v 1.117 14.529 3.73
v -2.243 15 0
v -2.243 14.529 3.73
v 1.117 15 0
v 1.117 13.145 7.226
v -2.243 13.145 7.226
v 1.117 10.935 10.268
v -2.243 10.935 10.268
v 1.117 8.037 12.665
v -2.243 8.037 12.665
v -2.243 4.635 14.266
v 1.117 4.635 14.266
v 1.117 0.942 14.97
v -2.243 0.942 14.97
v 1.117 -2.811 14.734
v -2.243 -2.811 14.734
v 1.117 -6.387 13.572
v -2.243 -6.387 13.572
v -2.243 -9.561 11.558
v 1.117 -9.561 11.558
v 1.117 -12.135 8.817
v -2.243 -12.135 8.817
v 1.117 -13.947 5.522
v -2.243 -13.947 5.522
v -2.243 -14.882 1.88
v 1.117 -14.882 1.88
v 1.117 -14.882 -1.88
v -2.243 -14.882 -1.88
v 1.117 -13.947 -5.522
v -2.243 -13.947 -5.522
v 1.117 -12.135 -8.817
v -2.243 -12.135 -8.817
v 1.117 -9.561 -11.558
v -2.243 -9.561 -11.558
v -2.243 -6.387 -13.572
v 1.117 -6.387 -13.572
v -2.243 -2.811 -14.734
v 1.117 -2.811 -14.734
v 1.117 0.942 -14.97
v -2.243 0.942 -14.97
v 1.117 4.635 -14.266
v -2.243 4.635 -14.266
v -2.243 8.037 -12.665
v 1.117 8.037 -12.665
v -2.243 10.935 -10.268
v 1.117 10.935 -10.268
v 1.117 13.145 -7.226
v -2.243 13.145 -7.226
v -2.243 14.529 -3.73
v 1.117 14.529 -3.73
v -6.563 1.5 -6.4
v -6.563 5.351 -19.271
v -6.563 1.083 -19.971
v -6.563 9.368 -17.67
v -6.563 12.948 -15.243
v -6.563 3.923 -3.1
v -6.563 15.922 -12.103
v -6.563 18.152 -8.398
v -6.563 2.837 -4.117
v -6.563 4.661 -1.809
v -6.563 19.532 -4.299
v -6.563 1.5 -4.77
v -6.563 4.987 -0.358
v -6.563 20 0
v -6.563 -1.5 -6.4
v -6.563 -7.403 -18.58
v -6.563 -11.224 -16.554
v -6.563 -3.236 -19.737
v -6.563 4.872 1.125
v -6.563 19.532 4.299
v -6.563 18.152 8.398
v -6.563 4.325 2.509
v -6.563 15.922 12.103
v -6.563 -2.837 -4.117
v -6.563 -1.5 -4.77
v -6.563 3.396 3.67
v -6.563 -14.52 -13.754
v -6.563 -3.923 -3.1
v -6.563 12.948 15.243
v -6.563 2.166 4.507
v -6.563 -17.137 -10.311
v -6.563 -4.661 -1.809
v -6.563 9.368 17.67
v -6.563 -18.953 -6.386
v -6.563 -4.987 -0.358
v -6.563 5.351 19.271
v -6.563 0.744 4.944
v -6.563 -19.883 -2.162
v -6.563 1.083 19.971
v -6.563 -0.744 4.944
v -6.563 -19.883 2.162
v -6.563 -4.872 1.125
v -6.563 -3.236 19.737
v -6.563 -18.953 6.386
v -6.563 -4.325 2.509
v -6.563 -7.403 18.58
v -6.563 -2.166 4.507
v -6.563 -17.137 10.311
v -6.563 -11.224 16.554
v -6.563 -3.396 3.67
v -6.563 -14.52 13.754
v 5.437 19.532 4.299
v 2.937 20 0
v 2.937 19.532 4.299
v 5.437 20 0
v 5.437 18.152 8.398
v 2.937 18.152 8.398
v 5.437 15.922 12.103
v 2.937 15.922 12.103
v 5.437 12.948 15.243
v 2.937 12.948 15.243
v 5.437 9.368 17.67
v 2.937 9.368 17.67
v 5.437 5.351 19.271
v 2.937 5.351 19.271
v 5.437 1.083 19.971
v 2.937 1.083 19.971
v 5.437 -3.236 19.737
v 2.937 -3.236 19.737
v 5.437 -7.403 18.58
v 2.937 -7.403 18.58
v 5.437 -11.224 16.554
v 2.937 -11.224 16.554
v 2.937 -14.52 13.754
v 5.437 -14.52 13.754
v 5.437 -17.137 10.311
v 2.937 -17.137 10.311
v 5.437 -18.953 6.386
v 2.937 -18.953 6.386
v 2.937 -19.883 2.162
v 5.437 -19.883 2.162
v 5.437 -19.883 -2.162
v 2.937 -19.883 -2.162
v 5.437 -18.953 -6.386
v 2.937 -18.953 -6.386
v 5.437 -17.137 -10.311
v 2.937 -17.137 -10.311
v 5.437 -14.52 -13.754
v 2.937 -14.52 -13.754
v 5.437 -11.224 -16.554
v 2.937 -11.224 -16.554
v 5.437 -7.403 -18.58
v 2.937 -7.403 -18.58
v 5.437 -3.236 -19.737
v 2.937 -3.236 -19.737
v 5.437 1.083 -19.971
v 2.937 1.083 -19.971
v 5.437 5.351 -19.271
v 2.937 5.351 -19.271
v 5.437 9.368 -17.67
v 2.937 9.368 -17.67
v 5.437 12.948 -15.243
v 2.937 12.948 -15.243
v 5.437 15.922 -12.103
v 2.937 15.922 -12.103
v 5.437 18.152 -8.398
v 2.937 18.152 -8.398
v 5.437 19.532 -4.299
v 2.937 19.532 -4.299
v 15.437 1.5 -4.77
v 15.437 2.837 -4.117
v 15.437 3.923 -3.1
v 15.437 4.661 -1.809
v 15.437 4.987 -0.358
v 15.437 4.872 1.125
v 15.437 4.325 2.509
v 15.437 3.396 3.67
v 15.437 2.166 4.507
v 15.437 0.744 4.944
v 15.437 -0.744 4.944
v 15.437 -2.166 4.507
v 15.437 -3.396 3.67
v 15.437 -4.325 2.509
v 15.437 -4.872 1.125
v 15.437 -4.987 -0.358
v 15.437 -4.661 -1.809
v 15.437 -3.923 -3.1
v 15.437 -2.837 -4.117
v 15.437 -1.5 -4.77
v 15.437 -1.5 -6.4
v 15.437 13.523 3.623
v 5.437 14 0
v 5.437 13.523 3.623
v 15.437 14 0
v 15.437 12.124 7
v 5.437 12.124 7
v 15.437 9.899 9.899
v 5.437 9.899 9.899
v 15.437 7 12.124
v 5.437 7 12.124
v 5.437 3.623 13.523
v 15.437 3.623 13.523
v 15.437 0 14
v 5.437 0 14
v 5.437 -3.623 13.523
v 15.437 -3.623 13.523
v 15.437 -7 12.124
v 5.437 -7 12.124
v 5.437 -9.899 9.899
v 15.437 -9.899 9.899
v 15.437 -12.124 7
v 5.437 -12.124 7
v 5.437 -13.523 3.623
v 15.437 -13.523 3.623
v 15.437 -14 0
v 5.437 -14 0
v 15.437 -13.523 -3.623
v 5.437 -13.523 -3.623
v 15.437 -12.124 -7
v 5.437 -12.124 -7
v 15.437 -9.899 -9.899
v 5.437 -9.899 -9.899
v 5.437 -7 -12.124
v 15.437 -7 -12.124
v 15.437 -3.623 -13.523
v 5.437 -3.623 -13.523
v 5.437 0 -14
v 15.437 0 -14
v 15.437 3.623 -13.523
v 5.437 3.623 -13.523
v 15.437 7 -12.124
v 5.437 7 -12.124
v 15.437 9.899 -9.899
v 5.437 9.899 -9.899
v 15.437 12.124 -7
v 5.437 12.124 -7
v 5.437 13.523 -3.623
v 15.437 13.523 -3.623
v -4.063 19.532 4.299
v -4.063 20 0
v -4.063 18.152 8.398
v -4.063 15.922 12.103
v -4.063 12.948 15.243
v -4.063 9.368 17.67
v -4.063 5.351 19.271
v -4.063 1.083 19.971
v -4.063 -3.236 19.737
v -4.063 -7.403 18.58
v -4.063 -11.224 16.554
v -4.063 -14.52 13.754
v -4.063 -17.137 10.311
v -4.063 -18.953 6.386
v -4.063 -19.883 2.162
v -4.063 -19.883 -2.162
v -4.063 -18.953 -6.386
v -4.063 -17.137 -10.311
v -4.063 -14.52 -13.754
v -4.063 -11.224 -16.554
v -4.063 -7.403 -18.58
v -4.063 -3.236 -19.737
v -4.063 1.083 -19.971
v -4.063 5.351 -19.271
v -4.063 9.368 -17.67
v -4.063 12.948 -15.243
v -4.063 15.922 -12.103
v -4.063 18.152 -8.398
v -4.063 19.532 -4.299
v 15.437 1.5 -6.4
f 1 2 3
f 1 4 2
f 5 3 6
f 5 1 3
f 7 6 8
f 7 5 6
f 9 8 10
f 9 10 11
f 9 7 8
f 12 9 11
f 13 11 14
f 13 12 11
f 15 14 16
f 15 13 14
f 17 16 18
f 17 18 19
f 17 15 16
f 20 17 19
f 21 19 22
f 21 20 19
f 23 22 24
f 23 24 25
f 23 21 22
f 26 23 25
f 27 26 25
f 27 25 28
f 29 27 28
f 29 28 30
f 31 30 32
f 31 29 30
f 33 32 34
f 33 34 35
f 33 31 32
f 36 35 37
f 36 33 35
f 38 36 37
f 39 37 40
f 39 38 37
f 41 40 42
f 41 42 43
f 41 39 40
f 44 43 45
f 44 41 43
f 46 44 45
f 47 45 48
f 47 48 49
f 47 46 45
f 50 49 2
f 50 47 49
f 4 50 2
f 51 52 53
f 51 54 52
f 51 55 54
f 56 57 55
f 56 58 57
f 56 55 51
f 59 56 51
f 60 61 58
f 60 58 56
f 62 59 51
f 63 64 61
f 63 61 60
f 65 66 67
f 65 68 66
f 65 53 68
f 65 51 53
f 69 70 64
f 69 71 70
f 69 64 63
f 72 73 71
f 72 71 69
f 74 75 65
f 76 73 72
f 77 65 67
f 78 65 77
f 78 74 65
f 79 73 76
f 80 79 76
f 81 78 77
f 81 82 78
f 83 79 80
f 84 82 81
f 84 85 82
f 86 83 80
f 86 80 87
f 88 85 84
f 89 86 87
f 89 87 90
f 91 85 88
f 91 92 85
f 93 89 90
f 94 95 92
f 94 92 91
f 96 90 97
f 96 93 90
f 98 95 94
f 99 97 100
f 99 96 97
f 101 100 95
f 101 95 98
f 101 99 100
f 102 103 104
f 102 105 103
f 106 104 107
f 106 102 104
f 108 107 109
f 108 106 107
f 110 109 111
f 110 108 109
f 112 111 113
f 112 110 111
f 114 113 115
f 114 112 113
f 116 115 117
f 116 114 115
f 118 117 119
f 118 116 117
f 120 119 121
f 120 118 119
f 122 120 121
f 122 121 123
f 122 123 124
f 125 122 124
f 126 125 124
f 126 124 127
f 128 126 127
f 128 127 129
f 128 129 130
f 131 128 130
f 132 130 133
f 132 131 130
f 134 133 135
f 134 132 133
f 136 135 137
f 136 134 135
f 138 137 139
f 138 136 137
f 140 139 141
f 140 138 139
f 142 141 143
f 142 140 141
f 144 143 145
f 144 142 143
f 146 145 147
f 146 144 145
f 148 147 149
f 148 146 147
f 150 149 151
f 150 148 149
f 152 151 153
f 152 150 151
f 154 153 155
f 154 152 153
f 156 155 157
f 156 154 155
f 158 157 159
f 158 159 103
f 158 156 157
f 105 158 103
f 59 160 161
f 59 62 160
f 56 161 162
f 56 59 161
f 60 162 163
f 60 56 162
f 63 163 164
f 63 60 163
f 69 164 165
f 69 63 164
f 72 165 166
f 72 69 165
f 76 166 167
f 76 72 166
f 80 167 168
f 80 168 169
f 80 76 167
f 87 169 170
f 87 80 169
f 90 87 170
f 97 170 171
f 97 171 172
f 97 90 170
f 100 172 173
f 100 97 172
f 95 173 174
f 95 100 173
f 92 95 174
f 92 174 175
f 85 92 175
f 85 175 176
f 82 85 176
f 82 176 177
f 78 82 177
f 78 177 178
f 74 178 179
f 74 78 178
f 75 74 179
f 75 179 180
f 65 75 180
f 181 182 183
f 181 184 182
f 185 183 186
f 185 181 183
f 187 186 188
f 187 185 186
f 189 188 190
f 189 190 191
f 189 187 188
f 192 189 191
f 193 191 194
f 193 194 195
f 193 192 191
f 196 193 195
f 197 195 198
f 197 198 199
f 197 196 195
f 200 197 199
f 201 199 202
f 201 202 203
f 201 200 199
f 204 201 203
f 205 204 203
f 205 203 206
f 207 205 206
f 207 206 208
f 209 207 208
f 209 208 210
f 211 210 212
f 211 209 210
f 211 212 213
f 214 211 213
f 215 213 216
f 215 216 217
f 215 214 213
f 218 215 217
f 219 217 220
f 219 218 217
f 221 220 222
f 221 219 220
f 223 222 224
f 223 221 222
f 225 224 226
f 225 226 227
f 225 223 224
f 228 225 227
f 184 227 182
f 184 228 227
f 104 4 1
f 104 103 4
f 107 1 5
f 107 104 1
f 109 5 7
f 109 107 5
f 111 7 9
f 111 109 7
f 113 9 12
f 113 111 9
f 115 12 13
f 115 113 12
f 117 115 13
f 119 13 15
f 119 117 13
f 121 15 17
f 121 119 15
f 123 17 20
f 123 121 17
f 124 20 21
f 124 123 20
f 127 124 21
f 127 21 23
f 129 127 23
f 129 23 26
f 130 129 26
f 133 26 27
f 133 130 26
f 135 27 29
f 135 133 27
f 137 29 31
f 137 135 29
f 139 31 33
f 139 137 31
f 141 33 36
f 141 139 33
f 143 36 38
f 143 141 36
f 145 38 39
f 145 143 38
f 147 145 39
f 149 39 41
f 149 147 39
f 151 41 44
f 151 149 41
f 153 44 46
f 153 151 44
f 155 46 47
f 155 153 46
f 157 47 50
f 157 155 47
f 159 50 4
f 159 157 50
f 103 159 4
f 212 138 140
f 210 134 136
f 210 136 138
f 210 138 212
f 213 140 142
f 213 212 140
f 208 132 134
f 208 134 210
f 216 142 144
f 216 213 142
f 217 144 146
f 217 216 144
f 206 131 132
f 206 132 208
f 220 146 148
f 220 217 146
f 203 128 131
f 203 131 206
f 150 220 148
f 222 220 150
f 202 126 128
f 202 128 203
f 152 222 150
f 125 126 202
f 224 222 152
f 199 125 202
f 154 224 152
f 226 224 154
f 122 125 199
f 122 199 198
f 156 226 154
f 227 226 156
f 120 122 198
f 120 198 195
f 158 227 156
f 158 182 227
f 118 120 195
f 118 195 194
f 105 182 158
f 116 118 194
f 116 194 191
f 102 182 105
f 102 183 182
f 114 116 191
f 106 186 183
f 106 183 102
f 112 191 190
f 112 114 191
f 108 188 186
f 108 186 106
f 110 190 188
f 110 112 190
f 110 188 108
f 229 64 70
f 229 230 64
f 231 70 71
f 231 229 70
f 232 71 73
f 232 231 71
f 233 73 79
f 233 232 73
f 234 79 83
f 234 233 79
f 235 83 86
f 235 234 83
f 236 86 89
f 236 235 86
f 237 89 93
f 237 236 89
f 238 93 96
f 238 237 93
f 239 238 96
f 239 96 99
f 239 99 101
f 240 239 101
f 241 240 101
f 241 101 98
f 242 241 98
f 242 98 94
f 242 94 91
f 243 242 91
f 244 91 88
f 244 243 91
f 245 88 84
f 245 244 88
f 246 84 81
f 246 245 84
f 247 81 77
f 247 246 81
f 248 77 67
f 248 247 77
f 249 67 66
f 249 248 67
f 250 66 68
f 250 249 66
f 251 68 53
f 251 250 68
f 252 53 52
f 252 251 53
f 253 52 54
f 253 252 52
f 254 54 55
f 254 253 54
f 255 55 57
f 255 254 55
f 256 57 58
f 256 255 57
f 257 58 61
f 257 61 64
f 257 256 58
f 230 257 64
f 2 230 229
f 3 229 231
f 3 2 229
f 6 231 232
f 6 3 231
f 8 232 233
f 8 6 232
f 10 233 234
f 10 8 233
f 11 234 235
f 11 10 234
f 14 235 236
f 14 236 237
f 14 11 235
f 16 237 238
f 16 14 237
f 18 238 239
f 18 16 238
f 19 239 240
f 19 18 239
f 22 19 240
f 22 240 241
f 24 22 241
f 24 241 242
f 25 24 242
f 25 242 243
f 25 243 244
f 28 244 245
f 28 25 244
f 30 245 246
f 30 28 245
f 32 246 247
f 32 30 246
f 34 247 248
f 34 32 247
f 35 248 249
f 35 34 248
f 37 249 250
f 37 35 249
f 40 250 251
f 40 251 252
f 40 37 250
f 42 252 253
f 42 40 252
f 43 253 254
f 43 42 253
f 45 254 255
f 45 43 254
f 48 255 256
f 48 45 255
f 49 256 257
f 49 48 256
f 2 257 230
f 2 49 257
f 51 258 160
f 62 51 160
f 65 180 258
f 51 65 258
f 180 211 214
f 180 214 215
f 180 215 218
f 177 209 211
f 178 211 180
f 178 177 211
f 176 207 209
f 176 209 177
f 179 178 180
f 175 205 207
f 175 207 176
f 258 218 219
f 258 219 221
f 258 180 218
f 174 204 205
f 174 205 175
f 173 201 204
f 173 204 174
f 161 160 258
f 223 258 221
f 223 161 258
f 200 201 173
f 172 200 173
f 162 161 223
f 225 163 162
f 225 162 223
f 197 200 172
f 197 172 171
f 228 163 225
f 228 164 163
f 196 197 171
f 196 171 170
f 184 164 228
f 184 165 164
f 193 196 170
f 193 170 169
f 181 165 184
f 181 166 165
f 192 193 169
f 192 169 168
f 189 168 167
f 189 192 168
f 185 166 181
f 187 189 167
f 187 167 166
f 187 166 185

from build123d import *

# Parameters (mm, degrees)
CUT_EXTRUDE1_DEPTH      = 1
CUT_EXTRUDE1_DEPTH_BACK = 23


with BuildPart() as part:
    # Sketch1 → Revolve1 (revolve)
    with BuildSketch(Plane.XY):
        Polygon((-6.562817936, 5), (-6.562817936, 20), (-4.062817936, 20), (-2.242966765, 15), (1.117330893, 15), (2.937182064, 20), (5.437182064, 20), (5.437182064, 14), (15.437182064, 14), (15.437182064, 5), align=None)
    revolve(axis=Axis((-16.510808735, 0, 0), (1, 0, 0)))

    # Sketch2 → Cut-Extrude1 (cut, two sides)
    with BuildSketch(Plane(origin=(15.437182064, 0, 0), x_dir=(0, 0, -1), z_dir=(1, 0, 0))) as cut_extrude1_sk:
        with BuildLine():
            Line((4.769696007, -1.5), (6.4, -1.5))
            Line((6.4, -1.5), (6.4, 1.5))
            Line((6.4, 1.5), (4.769696007, 1.5))
            ThreePointArc((4.769696007, 1.5), (5, 0), (4.769696007, -1.5))
        make_face()
    extrude(amount=CUT_EXTRUDE1_DEPTH, mode=Mode.SUBTRACT)
    extrude(cut_extrude1_sk.sketch, amount=-CUT_EXTRUDE1_DEPTH_BACK, mode=Mode.SUBTRACT)


solid = part.part
